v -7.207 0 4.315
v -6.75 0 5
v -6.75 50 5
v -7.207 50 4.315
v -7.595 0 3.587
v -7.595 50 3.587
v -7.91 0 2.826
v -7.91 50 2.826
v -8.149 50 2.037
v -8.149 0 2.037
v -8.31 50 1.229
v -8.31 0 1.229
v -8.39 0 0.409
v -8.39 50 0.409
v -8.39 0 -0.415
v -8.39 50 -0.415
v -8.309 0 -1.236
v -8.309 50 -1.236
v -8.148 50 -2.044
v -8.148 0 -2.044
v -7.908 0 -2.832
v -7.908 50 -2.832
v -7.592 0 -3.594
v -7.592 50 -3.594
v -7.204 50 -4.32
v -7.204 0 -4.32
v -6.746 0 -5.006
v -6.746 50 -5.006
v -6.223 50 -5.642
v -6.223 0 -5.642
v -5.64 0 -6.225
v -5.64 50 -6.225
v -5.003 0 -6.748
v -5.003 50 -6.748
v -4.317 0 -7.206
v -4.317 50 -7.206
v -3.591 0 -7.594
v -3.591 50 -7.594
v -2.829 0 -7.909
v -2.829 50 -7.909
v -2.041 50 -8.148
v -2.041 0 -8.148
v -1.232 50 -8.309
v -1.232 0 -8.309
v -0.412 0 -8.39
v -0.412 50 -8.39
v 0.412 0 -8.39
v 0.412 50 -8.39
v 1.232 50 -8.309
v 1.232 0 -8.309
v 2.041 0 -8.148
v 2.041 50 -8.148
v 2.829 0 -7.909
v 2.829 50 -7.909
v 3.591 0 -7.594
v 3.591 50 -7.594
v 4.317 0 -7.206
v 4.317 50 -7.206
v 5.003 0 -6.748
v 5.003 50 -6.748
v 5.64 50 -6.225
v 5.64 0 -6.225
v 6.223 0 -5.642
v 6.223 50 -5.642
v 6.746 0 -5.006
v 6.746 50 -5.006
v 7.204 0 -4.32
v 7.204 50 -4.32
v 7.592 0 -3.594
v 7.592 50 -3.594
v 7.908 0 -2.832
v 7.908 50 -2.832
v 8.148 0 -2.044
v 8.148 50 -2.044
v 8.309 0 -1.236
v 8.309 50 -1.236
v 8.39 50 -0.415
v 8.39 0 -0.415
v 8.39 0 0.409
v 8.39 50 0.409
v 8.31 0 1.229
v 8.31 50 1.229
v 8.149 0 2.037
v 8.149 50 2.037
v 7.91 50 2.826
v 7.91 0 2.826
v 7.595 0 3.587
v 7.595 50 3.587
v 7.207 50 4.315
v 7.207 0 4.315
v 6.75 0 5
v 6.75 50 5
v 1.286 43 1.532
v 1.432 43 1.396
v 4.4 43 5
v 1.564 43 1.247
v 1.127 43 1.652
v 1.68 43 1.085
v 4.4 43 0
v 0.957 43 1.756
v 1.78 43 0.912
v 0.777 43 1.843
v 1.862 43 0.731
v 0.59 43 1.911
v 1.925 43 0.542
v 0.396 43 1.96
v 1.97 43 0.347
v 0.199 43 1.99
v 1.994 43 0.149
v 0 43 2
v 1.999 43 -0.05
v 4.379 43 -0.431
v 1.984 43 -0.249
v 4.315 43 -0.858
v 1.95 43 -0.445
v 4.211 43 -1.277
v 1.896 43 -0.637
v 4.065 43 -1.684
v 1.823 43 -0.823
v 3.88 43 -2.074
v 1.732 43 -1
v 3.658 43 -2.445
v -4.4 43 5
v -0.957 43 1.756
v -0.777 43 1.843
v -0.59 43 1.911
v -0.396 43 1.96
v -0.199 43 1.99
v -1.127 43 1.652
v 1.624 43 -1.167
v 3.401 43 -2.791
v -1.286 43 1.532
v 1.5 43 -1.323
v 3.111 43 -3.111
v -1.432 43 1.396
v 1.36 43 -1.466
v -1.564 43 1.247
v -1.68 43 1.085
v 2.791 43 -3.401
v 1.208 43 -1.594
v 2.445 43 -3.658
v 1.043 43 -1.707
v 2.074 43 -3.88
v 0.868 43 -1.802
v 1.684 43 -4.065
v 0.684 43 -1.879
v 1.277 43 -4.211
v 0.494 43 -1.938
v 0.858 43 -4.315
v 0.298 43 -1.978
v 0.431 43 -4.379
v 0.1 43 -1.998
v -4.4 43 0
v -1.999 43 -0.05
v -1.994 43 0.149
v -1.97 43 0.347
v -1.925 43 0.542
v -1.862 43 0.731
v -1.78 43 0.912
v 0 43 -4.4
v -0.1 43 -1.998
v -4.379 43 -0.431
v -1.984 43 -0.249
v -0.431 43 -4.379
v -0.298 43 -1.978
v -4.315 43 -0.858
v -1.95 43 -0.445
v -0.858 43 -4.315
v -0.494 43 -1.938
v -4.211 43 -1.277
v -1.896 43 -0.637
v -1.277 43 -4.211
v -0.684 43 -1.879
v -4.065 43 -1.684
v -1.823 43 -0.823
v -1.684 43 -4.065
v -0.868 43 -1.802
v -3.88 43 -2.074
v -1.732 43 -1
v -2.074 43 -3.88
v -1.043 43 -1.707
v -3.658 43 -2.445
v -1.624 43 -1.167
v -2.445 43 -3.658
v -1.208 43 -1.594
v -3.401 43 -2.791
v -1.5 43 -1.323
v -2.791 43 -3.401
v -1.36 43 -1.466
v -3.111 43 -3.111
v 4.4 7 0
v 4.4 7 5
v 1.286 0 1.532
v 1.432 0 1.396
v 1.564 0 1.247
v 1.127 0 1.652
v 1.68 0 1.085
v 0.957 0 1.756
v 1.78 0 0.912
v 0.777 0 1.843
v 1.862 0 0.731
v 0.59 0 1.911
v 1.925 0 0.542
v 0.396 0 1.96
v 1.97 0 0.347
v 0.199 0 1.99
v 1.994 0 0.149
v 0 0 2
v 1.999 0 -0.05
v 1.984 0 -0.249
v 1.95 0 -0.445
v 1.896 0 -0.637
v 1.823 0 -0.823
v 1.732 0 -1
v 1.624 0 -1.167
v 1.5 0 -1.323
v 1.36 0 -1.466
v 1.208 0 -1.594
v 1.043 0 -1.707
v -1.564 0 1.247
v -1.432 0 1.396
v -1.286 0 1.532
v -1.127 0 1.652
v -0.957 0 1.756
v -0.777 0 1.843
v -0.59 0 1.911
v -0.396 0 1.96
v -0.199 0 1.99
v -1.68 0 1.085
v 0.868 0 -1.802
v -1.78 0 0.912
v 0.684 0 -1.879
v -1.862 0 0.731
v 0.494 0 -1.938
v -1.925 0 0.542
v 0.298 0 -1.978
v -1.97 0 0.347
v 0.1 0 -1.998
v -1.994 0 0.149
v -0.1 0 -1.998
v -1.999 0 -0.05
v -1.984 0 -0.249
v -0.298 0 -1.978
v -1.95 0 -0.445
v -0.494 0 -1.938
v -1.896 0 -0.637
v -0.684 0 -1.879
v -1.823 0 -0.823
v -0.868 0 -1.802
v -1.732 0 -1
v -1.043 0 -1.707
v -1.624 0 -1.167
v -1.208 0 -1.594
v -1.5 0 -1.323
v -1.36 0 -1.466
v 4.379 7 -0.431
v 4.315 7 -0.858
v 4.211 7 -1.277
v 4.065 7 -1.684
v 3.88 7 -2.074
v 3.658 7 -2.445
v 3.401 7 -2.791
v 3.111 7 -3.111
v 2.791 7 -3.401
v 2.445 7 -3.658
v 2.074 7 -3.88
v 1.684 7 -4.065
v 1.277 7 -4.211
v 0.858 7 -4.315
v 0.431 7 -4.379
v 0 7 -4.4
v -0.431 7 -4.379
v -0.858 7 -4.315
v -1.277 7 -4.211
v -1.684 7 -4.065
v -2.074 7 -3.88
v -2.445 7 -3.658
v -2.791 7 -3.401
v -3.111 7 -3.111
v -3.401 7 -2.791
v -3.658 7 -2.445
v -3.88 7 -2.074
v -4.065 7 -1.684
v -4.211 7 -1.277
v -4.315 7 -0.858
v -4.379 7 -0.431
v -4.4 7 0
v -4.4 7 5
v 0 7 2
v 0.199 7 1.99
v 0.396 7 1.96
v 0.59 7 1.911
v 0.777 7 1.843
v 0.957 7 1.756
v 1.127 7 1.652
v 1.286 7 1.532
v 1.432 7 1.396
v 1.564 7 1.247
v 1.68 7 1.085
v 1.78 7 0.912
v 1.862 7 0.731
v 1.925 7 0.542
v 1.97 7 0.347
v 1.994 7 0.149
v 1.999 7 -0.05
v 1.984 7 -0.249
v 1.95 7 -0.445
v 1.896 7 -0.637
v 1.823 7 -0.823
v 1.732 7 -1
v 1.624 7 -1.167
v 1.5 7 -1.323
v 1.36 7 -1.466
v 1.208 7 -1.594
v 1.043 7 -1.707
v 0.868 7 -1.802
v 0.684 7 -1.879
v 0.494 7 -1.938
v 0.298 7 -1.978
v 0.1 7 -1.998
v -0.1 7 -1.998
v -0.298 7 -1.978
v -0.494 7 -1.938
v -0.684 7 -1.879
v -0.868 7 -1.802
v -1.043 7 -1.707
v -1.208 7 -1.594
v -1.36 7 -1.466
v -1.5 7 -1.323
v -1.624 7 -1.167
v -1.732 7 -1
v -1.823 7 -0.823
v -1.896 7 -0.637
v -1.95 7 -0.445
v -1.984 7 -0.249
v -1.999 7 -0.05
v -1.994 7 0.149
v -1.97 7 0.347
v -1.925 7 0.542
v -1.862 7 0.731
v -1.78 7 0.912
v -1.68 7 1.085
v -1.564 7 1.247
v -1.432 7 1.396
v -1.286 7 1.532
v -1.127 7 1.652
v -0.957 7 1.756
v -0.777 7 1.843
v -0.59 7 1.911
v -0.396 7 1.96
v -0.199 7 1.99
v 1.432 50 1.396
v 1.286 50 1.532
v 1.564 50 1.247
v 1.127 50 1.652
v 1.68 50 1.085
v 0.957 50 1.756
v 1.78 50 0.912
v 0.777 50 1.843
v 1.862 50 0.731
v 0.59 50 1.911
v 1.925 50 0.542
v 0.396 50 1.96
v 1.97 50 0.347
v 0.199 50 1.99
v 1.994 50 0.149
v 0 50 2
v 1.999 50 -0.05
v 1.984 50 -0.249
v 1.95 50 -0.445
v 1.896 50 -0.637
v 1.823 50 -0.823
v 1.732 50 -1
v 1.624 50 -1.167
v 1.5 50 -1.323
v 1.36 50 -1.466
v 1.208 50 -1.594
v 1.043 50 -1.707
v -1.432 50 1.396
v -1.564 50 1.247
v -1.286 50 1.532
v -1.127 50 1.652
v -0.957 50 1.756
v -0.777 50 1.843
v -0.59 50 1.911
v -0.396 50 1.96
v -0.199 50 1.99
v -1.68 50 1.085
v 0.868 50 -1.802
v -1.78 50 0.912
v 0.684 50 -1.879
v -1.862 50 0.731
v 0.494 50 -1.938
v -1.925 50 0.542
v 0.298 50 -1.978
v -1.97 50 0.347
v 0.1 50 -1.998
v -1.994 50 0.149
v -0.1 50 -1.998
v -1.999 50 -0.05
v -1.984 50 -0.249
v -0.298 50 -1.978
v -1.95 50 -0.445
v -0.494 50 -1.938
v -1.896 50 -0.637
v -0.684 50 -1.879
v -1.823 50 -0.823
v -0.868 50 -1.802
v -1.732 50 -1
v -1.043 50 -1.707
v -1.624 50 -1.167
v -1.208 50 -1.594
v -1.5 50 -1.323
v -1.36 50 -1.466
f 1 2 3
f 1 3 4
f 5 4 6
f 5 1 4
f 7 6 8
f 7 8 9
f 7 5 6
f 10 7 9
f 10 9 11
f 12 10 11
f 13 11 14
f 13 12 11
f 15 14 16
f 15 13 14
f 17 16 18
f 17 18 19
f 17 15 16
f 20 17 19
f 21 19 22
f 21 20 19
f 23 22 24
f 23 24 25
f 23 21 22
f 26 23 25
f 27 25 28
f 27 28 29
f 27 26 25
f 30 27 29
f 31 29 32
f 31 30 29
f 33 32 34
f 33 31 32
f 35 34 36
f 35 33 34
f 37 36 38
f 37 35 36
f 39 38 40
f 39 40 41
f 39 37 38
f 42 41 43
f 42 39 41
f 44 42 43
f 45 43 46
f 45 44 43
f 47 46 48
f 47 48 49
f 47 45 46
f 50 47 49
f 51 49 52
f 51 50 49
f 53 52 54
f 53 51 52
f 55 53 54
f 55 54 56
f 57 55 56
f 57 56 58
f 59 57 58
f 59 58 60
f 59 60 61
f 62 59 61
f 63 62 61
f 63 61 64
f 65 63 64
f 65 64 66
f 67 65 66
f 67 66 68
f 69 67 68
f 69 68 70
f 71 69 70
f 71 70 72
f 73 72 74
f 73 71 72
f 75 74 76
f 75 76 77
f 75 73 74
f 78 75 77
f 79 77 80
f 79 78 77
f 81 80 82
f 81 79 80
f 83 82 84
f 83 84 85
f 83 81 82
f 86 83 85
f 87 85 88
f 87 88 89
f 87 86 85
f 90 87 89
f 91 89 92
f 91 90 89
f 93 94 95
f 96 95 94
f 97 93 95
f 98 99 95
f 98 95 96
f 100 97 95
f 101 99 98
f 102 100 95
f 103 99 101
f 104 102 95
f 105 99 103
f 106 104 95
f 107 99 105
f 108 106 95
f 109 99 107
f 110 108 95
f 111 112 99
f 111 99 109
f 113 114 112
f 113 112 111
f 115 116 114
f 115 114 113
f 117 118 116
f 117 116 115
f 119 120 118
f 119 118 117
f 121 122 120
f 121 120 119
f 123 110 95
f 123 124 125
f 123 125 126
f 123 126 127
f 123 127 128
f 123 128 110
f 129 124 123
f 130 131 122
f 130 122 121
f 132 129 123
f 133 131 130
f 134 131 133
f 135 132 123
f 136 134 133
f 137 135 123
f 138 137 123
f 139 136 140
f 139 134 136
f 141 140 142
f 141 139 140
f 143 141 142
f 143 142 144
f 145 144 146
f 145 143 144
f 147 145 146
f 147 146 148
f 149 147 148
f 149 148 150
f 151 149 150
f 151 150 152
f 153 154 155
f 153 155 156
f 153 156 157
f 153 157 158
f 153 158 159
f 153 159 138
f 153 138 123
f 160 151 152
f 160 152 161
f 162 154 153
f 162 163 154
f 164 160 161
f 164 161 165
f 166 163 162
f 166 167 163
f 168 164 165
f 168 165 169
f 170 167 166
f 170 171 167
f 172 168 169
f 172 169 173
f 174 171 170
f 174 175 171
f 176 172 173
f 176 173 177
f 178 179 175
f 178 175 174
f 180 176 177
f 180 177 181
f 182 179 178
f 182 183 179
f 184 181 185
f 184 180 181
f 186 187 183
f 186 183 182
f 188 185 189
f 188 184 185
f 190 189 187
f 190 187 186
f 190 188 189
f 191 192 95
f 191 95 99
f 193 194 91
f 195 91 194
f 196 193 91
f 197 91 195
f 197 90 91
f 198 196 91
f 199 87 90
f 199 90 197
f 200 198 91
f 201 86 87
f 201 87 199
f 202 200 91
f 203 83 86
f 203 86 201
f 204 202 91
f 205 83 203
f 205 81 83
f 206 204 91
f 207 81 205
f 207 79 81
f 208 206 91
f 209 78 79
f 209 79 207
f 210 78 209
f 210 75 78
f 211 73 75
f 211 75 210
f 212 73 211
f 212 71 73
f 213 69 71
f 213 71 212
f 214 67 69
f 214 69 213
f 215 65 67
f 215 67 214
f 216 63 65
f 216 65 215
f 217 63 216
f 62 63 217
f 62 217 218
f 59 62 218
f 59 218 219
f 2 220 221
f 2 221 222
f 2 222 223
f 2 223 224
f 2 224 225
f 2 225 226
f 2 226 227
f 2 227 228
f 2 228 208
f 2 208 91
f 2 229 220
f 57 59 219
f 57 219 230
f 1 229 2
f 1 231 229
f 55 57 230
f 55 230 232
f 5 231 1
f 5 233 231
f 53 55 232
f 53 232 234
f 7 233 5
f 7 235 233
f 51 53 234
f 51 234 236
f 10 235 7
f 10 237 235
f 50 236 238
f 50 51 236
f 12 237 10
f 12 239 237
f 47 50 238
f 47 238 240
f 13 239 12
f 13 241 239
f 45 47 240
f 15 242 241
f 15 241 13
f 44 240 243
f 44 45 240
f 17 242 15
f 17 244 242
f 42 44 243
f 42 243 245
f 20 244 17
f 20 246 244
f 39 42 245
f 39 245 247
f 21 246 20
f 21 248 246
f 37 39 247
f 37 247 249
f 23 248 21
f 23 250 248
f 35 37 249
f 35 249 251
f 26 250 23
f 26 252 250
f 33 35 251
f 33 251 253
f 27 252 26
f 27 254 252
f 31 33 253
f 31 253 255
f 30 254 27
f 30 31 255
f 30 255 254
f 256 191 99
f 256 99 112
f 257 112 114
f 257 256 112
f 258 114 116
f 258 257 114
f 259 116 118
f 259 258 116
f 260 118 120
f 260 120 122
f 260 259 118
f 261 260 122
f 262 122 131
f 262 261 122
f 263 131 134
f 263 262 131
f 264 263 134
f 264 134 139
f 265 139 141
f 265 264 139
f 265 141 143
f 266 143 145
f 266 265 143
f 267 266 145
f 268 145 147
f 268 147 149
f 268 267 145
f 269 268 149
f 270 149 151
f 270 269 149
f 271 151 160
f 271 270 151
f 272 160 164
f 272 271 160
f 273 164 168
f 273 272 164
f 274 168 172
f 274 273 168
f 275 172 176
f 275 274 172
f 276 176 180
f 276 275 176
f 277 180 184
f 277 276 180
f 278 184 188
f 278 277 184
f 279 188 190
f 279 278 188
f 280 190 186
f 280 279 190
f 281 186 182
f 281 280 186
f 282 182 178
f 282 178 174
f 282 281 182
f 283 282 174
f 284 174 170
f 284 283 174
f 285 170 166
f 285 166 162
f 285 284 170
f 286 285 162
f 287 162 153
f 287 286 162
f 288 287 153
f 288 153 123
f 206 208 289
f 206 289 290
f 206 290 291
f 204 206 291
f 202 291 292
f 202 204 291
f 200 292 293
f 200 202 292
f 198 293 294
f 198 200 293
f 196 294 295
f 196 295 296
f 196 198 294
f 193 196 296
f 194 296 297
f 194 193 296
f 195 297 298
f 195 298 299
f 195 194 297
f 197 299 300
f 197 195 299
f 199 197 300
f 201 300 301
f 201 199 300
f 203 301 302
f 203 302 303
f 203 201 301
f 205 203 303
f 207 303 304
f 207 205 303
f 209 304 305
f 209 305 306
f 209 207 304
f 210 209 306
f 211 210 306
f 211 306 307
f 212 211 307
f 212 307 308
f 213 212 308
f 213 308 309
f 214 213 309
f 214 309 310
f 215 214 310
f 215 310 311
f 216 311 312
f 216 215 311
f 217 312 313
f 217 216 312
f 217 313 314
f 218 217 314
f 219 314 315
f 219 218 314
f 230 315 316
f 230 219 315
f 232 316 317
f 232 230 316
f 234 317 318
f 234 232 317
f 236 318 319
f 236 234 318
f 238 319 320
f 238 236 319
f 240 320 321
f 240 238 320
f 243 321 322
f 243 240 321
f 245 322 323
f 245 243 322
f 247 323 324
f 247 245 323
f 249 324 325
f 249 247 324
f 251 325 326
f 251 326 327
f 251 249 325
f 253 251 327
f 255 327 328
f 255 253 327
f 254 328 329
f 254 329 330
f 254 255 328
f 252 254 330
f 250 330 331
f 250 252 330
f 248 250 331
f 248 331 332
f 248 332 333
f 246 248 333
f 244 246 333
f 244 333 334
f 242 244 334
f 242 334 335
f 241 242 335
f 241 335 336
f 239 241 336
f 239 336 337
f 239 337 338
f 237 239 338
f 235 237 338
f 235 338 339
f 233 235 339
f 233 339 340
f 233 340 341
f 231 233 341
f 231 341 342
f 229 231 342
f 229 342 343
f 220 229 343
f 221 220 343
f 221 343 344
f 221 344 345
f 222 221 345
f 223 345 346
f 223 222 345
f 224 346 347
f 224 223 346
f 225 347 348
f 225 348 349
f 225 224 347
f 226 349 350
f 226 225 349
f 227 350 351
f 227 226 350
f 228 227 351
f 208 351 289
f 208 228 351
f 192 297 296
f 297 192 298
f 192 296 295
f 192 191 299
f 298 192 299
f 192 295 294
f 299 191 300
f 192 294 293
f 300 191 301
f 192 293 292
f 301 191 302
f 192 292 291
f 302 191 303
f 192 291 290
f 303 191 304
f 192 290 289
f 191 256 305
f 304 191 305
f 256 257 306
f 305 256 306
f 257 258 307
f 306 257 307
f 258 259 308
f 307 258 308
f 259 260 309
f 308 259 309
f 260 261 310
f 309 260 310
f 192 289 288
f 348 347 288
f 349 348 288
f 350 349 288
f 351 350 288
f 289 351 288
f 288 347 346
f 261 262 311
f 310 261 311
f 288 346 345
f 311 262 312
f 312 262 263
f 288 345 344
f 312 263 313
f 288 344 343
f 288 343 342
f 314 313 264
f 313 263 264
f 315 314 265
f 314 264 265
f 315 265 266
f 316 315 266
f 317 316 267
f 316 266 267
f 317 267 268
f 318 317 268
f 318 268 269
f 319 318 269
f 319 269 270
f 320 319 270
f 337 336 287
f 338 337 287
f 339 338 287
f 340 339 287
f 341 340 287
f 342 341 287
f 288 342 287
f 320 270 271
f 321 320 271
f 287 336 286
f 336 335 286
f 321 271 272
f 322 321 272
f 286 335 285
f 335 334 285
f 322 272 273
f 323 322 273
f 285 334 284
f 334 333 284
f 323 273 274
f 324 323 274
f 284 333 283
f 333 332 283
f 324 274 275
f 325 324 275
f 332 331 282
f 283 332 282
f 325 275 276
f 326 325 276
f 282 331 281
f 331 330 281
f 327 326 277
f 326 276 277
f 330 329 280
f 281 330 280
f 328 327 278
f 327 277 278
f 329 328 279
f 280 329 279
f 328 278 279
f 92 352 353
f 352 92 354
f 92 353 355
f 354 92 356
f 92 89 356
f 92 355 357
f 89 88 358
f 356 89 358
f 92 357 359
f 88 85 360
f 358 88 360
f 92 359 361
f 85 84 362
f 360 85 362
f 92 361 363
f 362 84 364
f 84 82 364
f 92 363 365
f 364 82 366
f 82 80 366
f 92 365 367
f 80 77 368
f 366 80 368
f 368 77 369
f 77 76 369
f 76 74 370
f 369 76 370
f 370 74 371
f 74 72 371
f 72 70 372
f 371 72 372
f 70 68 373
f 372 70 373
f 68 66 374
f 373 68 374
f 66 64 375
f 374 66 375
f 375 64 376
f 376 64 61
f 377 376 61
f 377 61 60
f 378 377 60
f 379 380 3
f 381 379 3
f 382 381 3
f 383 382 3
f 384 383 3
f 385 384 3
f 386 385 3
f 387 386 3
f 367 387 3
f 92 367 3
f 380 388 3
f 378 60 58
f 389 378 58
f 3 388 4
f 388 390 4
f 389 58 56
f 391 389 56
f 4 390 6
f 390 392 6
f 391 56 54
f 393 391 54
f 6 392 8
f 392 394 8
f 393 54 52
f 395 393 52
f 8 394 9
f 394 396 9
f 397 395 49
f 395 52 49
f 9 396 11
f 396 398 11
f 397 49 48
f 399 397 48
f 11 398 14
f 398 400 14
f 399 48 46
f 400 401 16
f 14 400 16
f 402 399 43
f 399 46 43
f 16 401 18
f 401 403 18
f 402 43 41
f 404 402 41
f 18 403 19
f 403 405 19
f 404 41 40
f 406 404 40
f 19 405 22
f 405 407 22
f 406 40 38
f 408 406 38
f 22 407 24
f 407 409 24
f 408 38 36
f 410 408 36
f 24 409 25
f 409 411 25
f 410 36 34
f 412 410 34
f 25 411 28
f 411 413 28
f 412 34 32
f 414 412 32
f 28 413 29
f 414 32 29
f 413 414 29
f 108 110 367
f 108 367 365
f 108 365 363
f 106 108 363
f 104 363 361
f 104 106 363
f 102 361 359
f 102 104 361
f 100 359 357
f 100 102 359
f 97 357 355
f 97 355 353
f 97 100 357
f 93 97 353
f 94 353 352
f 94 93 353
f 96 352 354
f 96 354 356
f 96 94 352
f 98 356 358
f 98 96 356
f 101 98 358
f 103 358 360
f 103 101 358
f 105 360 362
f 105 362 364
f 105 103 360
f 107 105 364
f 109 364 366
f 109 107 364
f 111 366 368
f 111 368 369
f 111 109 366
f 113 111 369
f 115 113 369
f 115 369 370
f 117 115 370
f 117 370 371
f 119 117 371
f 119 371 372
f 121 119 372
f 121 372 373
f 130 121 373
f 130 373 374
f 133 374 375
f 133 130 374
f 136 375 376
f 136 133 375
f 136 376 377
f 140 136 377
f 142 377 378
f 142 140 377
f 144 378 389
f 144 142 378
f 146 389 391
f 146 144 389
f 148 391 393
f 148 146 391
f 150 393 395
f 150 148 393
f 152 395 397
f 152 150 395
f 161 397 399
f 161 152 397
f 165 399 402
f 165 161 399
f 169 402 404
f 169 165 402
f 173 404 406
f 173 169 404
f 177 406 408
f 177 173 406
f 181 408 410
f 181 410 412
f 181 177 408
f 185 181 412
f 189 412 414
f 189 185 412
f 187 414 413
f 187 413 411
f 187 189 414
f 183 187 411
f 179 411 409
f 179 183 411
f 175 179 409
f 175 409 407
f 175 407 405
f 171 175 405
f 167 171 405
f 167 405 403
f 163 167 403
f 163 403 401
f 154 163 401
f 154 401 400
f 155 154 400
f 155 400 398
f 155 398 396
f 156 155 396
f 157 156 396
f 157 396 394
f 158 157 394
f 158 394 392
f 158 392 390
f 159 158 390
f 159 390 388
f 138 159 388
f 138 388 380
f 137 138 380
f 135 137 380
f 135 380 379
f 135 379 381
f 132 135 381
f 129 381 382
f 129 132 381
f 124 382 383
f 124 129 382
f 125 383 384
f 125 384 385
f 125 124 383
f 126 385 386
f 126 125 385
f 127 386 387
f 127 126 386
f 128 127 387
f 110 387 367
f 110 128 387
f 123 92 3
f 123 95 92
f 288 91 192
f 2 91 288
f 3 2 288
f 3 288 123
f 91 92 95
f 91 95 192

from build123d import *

# Parameters (mm, degrees)
SKETCH1_R           = 2
BOSS_EXTRUDE1_DEPTH = 7
BOSS_EXTRUDE3_DEPTH = 36
SKETCH5_R           = 2
BOSS_EXTRUDE4_DEPTH = 7


with BuildPart() as part:
    # Sketch1 → Boss-Extrude1 (new body)
    with BuildSketch(Plane(origin=(0, 0, 0), x_dir=(1, 0, 0), z_dir=(0, 1, 0))):
        with BuildLine():
            Line((6.749814812, -5), (-6.749814812, -5))
            ThreePointArc((-6.749814812, -5), (0, 8.4), (6.749814812, -5))
        make_face()
        with Locations(Location((0, 0, 0), (0, 0, 270))):
            Circle(SKETCH1_R, mode=Mode.SUBTRACT)
    extrude(amount=BOSS_EXTRUDE1_DEPTH)

    # Sketch3 → Boss-Extrude3 (add)
    with BuildSketch(Plane(origin=(0, 7, 0), x_dir=(1, 0, 0), z_dir=(0, 1, 0))):
        with BuildLine():
            Line((-4.4, 0), (-4.4, -5))
            Line((-4.4, -5), (-6.749814812, -5))
            ThreePointArc((-6.749814812, -5), (0, 8.4), (6.749814812, -5))
            Line((6.749814812, -5), (4.4, -5))
            Line((4.4, -5), (4.4, 0))
            ThreePointArc((4.4, 0), (0, 4.4), (-4.4, 0))
        make_face()
    extrude(amount=BOSS_EXTRUDE3_DEPTH)

    # Sketch5 → Boss-Extrude4 (add)
    with BuildSketch(Plane(origin=(0, 43, 0), x_dir=(1, 0, 0), z_dir=(0, 1, 0))):
        with BuildLine():
            Line((6.749814812, -5), (-6.749814812, -5))
            ThreePointArc((-6.749814812, -5), (0, 8.4), (6.749814812, -5))
        make_face()
        with Locations(Location((0, 0, 0), (0, 0, 270))):
            Circle(SKETCH5_R, mode=Mode.SUBTRACT)
    extrude(amount=BOSS_EXTRUDE4_DEPTH)


solid = part.part
